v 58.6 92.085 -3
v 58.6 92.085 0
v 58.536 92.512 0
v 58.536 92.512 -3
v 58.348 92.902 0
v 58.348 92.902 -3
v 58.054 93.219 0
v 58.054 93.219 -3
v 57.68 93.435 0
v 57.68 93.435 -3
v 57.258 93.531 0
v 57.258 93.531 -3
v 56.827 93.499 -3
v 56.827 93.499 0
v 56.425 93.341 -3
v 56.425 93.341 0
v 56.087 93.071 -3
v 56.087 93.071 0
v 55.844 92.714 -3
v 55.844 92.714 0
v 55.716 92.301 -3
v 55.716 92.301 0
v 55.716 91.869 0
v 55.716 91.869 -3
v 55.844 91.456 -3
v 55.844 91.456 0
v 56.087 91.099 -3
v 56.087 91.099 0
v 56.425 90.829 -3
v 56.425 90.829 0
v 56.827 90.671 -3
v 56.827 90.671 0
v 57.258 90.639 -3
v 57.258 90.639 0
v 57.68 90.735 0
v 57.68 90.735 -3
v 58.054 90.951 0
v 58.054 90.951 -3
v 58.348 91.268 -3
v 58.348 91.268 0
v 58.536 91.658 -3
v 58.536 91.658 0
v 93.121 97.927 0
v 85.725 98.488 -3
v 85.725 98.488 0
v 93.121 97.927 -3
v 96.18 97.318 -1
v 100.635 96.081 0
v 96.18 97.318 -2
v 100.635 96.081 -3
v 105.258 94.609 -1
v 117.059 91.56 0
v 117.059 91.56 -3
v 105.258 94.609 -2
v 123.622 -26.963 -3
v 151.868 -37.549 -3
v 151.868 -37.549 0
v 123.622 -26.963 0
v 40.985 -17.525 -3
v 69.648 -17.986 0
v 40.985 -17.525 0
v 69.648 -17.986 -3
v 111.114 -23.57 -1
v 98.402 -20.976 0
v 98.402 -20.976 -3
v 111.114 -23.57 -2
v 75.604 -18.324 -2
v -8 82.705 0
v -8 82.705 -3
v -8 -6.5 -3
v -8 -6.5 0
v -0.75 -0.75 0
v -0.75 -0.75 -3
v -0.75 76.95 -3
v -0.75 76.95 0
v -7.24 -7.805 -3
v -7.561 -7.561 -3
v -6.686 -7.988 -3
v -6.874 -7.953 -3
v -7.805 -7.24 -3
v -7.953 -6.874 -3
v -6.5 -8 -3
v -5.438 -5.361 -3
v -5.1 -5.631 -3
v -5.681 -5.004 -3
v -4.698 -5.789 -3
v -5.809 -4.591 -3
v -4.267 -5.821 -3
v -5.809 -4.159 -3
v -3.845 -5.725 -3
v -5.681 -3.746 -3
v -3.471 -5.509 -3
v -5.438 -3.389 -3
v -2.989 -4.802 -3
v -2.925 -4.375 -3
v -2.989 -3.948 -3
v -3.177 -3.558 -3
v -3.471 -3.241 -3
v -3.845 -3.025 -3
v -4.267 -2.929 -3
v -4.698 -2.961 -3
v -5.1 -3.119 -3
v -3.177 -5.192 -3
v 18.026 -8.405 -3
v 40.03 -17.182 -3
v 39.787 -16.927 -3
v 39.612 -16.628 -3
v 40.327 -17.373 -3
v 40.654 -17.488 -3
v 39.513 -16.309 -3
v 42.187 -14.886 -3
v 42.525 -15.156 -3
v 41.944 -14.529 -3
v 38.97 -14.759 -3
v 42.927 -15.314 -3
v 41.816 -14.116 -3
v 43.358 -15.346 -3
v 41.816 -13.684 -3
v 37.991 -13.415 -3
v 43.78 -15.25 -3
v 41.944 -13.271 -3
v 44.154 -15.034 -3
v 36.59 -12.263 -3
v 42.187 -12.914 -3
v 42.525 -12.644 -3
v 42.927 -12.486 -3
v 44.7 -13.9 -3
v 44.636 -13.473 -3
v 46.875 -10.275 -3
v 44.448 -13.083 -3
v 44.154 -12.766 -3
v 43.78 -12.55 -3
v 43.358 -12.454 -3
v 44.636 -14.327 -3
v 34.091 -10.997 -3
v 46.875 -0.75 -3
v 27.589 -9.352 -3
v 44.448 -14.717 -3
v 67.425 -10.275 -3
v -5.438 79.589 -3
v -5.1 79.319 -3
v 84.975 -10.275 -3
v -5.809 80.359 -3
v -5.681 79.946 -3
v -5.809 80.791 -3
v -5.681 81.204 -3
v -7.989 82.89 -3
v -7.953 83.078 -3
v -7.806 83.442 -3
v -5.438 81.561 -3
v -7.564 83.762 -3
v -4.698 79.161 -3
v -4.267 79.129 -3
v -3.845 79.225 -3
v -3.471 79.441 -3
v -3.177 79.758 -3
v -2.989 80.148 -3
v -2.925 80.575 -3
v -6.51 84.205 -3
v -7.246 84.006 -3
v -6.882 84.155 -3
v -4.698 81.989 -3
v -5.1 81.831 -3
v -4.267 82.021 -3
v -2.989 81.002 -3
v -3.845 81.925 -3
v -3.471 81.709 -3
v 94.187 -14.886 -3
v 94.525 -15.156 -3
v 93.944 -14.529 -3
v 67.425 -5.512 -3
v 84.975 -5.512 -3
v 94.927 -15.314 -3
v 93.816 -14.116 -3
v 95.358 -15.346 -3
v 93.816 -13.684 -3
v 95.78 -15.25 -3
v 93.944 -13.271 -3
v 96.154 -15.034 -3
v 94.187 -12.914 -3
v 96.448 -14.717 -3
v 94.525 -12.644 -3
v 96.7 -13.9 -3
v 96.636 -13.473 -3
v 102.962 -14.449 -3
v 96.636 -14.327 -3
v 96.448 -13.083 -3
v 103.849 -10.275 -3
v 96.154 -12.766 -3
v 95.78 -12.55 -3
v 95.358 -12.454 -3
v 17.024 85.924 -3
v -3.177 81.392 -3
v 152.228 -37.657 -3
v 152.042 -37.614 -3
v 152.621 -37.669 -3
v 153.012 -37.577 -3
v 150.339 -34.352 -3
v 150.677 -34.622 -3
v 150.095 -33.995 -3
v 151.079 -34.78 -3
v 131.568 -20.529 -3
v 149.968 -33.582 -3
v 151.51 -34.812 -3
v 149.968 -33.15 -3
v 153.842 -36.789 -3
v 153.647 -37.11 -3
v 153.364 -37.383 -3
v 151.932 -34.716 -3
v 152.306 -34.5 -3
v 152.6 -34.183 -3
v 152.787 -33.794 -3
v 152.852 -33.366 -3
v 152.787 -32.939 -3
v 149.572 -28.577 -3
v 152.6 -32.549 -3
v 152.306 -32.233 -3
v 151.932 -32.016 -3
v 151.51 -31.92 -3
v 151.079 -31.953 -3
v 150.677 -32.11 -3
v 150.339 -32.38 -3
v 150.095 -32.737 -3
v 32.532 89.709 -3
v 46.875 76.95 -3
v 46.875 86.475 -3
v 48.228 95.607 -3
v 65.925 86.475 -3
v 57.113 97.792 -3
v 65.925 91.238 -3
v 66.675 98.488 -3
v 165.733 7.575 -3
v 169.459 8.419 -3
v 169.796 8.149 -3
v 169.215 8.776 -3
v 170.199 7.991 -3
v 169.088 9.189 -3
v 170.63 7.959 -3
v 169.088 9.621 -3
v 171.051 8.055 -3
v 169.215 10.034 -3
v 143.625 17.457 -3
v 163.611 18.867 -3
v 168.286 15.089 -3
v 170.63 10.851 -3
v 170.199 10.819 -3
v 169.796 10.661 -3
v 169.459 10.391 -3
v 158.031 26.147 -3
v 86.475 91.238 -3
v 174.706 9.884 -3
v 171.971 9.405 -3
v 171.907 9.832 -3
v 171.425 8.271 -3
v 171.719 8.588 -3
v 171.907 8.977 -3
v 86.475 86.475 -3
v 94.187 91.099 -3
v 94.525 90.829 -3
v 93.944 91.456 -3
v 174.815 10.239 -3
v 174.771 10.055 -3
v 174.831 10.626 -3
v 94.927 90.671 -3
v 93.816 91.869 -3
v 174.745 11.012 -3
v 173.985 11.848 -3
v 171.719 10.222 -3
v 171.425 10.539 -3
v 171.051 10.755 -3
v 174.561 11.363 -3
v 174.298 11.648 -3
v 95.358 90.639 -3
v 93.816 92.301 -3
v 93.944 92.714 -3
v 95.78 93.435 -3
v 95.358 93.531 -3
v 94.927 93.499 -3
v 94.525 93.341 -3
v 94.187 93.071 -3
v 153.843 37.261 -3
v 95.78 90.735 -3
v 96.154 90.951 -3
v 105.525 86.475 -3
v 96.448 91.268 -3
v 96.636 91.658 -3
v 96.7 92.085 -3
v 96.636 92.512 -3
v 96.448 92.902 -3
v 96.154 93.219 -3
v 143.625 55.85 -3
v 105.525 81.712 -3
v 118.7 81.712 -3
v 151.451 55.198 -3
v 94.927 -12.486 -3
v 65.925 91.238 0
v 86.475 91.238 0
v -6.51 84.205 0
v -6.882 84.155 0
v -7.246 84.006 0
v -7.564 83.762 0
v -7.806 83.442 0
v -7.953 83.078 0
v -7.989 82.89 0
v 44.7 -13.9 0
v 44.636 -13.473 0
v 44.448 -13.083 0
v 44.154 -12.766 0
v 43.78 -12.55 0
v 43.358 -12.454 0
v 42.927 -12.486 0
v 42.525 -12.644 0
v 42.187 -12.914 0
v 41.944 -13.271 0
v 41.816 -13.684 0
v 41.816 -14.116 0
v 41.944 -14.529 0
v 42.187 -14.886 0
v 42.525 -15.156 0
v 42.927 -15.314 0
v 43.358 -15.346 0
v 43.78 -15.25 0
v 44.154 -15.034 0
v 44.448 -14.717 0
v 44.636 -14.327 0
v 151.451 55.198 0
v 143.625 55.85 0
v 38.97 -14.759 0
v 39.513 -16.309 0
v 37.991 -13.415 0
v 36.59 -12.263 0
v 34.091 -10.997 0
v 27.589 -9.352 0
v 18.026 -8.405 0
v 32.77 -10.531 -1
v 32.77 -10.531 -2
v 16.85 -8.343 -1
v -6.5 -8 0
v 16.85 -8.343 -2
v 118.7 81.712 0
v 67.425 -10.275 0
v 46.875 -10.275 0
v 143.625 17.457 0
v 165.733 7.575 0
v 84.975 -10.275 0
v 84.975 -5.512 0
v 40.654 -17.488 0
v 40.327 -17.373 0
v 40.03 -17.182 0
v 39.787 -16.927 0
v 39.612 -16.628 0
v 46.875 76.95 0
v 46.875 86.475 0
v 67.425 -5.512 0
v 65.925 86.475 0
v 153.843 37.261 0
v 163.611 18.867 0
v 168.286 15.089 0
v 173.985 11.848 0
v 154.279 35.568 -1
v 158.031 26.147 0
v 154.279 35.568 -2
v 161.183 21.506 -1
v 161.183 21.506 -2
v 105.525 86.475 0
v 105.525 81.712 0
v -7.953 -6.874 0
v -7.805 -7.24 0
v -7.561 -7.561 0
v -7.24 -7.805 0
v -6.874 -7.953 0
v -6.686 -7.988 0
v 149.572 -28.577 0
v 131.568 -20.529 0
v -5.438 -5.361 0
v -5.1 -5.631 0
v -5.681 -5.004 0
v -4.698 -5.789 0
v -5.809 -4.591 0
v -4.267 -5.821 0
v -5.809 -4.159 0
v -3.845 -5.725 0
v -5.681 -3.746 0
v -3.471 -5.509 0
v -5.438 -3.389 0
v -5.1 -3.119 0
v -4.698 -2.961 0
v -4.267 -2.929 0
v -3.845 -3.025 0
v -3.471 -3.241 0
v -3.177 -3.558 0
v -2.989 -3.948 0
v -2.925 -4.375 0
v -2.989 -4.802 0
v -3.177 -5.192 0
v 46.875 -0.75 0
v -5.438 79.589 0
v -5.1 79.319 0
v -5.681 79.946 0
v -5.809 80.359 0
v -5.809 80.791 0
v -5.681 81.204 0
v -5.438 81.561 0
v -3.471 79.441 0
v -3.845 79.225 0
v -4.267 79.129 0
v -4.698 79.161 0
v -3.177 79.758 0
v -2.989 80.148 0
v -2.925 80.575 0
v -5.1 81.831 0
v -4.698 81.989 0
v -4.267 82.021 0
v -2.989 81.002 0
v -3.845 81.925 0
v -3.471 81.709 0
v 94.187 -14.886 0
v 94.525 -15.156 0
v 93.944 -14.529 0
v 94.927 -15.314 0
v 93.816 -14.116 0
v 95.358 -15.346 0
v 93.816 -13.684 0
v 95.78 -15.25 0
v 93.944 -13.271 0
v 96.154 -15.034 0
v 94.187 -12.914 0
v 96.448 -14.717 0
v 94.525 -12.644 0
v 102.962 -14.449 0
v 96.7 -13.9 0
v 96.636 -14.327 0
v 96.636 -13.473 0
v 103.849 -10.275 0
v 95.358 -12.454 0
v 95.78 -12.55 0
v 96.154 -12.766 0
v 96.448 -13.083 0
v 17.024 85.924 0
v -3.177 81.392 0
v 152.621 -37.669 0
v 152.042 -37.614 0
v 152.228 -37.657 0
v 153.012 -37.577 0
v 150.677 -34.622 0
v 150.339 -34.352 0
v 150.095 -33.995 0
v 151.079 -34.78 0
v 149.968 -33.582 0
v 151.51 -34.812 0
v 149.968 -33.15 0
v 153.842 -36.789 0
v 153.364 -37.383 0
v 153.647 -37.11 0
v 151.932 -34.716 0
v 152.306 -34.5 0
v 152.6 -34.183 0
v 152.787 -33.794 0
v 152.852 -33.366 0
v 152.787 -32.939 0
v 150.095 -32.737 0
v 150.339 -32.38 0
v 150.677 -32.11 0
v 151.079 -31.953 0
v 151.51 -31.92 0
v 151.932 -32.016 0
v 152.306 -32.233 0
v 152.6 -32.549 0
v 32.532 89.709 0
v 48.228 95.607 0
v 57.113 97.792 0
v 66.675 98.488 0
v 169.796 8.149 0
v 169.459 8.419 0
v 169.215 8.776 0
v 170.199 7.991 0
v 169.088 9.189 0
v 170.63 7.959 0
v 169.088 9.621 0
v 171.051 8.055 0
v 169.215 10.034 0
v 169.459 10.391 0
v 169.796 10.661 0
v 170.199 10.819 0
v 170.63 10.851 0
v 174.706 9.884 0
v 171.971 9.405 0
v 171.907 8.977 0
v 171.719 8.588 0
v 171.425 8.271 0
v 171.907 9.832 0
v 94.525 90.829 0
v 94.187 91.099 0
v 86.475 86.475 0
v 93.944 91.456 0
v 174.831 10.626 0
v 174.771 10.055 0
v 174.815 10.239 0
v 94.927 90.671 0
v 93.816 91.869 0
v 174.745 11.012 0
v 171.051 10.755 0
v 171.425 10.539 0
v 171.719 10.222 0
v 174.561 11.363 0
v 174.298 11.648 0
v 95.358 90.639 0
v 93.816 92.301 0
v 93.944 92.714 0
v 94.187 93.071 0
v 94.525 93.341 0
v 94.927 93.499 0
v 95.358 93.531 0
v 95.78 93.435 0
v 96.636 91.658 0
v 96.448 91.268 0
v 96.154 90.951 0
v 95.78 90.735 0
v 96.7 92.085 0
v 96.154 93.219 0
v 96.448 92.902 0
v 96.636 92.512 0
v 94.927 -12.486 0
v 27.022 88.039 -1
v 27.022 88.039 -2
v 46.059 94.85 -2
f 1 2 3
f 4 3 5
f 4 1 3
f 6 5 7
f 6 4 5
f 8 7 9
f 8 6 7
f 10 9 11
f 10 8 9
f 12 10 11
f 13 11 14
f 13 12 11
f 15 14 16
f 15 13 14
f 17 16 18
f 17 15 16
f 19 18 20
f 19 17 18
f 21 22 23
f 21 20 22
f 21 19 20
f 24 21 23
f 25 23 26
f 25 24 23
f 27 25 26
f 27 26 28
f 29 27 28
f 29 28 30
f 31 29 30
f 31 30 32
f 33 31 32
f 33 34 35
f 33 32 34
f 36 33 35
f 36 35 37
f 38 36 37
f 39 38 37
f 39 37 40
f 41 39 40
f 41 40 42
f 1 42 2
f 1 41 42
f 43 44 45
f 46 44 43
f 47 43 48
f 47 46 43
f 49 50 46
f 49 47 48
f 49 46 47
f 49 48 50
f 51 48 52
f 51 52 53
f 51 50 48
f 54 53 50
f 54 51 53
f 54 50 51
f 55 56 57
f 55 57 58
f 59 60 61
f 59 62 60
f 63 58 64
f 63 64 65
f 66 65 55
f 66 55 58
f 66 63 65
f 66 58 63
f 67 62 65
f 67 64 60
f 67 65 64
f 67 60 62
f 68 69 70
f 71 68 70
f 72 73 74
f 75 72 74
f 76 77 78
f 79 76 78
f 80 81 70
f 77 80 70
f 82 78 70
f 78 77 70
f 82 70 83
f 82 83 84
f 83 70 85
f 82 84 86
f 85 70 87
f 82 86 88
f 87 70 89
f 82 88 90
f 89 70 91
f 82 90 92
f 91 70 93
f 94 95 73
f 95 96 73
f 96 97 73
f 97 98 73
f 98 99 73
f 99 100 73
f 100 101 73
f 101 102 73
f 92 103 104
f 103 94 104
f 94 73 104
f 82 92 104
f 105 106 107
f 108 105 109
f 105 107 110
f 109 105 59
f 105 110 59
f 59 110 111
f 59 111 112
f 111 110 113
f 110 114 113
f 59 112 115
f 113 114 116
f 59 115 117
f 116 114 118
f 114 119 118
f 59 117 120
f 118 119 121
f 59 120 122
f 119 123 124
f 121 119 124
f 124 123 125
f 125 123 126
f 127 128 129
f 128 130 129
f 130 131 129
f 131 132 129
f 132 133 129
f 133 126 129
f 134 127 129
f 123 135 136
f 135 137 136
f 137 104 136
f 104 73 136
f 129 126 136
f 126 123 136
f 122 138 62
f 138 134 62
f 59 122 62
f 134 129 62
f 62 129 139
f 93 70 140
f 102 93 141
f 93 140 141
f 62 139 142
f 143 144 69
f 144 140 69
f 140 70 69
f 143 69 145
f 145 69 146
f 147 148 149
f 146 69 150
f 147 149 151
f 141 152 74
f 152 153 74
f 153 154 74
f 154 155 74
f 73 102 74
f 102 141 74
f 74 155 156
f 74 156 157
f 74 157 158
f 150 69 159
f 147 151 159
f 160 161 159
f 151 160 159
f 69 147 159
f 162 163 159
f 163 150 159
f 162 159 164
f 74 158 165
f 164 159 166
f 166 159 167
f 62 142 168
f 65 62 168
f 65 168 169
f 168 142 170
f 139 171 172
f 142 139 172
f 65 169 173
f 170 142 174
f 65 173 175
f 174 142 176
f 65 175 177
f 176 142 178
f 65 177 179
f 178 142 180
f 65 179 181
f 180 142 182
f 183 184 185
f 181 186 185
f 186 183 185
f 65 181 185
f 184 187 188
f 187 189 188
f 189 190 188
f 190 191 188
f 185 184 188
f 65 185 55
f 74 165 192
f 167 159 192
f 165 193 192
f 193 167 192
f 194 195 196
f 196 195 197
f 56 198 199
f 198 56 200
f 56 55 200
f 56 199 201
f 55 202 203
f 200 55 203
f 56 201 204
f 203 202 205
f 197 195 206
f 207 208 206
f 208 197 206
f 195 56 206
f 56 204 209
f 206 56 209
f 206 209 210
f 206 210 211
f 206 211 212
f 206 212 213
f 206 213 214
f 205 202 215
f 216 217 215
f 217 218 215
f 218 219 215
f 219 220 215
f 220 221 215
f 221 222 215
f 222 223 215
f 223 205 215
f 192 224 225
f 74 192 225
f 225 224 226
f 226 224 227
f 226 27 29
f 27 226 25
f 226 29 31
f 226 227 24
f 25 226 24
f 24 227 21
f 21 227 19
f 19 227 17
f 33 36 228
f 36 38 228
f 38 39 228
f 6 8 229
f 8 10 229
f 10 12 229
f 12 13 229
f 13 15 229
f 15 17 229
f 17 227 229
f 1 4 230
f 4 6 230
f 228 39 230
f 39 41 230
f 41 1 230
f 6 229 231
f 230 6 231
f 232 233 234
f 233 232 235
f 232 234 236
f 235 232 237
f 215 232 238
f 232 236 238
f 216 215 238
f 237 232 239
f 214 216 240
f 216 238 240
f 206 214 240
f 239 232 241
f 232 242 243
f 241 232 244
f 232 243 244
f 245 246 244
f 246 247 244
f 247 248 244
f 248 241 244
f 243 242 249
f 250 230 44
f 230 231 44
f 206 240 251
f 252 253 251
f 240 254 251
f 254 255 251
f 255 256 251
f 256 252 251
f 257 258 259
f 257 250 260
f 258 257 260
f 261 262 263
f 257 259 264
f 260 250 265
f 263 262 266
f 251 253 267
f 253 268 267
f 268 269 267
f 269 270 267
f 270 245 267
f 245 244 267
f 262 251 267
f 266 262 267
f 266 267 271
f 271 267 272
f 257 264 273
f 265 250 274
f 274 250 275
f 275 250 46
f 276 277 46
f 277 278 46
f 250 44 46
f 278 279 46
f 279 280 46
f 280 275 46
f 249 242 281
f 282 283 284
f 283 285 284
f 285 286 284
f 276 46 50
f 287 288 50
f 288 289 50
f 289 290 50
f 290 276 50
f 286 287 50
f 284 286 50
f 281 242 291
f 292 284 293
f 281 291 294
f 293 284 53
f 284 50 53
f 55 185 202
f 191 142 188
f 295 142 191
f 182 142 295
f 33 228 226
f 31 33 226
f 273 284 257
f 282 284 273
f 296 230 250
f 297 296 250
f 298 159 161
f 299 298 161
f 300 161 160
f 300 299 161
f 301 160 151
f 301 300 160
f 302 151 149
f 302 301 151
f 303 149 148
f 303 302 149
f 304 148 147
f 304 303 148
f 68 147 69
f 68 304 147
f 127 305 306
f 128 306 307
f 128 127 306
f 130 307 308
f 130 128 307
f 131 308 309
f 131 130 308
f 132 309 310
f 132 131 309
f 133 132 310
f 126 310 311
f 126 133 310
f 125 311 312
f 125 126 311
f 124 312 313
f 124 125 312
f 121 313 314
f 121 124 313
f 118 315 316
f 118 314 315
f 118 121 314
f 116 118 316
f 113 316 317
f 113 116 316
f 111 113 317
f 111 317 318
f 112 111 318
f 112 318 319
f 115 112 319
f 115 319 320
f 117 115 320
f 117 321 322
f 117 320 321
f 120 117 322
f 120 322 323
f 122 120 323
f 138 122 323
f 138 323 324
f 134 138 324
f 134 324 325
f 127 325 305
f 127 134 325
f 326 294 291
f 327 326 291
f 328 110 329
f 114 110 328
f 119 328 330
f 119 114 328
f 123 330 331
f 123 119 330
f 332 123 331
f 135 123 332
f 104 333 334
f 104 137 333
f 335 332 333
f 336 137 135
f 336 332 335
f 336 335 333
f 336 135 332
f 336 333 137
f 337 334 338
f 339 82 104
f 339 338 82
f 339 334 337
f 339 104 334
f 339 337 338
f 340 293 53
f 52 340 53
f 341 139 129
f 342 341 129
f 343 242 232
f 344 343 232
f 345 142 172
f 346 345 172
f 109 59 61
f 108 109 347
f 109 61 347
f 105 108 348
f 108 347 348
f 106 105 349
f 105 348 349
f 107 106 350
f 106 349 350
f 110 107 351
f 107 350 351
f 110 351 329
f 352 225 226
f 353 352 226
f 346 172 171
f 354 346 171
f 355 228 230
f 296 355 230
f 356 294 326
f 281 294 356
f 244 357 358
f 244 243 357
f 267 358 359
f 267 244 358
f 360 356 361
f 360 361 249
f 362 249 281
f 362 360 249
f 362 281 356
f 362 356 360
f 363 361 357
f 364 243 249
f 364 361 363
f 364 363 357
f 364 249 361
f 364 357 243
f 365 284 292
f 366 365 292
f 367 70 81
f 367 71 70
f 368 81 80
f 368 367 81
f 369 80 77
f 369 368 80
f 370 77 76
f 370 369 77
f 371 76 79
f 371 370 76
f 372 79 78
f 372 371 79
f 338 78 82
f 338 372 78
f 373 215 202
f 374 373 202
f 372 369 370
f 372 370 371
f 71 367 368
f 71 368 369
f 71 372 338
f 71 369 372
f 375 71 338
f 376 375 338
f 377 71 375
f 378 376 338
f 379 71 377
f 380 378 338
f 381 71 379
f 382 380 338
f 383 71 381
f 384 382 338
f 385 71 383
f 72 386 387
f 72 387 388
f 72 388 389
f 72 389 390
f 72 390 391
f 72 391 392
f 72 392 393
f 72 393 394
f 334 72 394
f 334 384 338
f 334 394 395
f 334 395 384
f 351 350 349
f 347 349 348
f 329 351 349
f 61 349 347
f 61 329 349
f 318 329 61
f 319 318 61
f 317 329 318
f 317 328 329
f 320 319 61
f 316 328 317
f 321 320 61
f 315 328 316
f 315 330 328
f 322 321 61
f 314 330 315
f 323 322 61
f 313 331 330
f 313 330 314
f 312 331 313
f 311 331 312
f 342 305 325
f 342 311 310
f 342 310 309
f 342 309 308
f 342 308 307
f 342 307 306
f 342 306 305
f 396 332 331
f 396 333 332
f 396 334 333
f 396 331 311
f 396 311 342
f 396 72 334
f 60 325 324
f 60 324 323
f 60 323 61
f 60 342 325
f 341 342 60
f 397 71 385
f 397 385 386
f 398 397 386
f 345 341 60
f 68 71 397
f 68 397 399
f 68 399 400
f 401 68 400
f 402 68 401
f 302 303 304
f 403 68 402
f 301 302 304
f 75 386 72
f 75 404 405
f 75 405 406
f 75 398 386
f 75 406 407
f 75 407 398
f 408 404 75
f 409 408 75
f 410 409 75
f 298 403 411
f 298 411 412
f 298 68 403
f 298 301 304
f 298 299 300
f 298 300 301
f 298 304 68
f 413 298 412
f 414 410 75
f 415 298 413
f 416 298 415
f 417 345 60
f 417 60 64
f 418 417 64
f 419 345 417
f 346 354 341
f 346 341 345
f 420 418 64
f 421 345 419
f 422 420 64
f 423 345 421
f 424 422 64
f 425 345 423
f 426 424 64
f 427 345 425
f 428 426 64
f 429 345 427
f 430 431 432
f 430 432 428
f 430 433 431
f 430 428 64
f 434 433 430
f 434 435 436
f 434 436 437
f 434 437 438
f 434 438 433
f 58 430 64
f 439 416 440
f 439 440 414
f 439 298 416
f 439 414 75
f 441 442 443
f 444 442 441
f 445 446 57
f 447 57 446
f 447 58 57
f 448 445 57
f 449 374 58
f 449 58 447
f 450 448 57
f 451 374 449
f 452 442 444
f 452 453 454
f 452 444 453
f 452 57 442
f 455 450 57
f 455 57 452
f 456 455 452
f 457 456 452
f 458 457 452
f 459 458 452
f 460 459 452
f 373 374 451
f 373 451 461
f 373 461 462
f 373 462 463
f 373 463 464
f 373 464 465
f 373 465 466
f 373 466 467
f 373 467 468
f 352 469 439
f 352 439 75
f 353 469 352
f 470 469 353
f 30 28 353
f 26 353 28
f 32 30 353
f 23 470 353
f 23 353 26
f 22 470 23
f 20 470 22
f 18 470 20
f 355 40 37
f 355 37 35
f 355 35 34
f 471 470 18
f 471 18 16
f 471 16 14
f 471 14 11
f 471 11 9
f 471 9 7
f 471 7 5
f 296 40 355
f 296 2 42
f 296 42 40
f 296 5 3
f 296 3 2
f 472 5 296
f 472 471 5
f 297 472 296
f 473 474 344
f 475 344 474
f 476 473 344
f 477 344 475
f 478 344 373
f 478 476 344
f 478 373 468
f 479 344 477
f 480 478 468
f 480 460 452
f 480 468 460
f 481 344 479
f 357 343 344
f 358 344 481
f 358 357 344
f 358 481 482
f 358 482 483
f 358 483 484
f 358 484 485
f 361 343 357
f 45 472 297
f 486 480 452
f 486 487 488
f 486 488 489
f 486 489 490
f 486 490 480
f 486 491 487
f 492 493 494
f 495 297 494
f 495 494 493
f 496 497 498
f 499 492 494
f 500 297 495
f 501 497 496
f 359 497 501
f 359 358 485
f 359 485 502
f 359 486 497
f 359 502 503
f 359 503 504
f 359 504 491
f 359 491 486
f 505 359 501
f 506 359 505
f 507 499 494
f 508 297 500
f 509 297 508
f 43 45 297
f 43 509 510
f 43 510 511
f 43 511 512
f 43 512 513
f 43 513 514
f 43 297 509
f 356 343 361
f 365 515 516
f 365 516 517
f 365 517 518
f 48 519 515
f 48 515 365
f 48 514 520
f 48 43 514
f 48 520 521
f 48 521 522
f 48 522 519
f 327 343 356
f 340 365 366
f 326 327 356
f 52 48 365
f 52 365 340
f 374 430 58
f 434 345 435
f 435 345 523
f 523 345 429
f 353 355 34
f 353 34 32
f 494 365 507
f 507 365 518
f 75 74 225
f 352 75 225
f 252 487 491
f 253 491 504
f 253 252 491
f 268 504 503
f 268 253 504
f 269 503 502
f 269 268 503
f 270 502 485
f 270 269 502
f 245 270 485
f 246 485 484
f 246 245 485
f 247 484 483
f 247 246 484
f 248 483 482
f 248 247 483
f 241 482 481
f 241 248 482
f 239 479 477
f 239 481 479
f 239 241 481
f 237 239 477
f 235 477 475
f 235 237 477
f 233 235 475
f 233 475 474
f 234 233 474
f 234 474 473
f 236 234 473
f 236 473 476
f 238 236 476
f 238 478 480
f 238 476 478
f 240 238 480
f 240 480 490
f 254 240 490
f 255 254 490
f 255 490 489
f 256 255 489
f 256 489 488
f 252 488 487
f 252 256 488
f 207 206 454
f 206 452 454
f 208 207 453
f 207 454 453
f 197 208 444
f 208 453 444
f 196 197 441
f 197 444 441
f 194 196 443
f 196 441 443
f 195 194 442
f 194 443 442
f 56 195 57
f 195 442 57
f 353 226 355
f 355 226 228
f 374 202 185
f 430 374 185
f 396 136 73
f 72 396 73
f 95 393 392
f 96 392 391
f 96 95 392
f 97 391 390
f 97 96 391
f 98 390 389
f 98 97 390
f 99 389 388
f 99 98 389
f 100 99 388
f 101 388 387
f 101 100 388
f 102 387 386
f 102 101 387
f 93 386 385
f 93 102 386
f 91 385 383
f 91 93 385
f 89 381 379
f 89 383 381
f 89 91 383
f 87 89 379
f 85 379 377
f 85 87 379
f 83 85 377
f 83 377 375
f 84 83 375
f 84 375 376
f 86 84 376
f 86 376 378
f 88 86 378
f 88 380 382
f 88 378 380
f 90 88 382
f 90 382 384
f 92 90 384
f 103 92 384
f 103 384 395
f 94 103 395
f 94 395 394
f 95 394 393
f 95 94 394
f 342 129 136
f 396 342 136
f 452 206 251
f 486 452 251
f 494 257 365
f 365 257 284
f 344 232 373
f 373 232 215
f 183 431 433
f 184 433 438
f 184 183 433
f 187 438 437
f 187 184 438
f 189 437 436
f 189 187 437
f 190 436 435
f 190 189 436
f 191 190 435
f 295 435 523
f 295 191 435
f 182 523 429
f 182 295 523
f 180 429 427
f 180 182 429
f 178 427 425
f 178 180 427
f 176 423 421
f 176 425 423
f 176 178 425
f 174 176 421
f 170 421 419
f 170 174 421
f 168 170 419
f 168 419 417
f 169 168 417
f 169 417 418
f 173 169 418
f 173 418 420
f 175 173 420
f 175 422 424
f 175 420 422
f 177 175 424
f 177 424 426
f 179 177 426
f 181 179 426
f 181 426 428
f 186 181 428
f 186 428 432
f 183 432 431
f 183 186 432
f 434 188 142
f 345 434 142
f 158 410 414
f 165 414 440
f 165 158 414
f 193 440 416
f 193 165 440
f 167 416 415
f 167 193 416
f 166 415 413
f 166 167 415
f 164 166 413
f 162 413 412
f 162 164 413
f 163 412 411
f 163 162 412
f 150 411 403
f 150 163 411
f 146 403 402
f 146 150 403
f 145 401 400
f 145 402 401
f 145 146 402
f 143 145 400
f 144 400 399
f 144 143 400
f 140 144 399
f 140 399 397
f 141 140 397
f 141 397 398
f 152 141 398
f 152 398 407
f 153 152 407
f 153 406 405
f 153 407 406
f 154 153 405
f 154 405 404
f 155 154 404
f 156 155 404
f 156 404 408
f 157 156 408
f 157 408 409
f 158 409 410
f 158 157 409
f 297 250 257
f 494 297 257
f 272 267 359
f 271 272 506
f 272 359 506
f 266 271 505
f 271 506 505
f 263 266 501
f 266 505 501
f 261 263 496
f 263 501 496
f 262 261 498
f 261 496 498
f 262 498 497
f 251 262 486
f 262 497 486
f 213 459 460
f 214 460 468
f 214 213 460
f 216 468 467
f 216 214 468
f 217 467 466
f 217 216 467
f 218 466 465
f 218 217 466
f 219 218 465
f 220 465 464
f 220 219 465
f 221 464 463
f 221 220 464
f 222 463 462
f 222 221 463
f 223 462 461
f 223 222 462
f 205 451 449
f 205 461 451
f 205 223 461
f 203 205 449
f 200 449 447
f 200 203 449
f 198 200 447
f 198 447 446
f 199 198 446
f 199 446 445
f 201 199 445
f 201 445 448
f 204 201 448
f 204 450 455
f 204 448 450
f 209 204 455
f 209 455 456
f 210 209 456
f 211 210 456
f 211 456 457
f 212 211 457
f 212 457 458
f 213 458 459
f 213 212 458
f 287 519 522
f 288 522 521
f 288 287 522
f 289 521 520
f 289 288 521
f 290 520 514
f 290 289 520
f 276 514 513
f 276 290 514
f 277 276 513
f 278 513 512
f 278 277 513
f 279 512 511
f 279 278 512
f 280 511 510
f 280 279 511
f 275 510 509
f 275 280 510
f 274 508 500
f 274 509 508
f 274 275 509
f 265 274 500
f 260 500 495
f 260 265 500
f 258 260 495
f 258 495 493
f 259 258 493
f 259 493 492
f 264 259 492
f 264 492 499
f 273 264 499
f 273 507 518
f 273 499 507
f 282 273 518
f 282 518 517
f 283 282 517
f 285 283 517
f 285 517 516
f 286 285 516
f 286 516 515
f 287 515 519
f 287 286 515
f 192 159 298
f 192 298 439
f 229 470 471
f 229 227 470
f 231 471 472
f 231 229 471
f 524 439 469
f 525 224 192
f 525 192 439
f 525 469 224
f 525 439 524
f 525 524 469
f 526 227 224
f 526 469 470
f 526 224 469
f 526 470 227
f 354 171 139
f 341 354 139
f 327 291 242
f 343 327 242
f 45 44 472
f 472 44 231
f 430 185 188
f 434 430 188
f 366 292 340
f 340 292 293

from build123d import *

# Parameters (mm, degrees)
PAD005_DEPTH    = 3
POCKET008_DEPTH = 5
SKETCH040_R     = 1.45
POCKET020_DEPTH = 15
POCKET026_DEPTH = 14
FILLET003_R     = 1.5


with BuildPart() as part:
    # Sketch024 → Pad005 (new body)
    with BuildSketch(Plane.XY):
        with BuildLine():
            Line((85.725, 98.4875), (66.675, 98.4875))
            add(Edge.make_bspline(
                [(-8, 84.2), (39.625, 84.2), (39.625, 98.4875), (66.675, 98.4875)],
                knots=[0, 0, 0, 0, 1, 1, 1, 1], degree=3))
            Line((-8, 84.2), (-8, -8))
            add(Edge.make_bspline(
                [(39.625, -17.525), (39.625, -8), (20.575, -8), (-8, -8)],
                knots=[0, 0, 0, 0, 1, 1, 1, 1], degree=3))
            add(Edge.make_bspline(
                [(153.231854, -38.154949), (107.082107, -17.525), (76.2, -17.525), (39.625, -17.525)],
                knots=[0, 0, 0, 0, 1, 1, 1, 1], degree=3))
            Line((153.231854, -38.154949), (175.310198, 11.234895))
            add(Edge.make_bspline(
                [(150.875, 88.9625), (150.875, 42.8625), (150.875, 22.157965), (175.310198, 11.234895)],
                knots=[0, 0, 0, 0, 1, 1, 1, 1], degree=3))
            add(Edge.make_bspline(
                [(85.725, 98.4875), (104.775, 98.4875), (104.775, 88.9625), (150.875, 88.9625)],
                knots=[0, 0, 0, 0, 1, 1, 1, 1], degree=3))
        make_face()
    extrude(amount=PAD005_DEPTH)

    # Sketch025 → Pocket008 (cut)
    with BuildSketch(Plane(origin=(0, 0, 0), x_dir=(1, 0, 0), z_dir=(0, 0, -1))):
        Polygon((-0.75, 0.75), (-0.75, -76.95), (46.875, -76.95), (46.875, -86.475), (65.925, -86.475), (65.925, -91.2375), (86.475, -91.2375), (86.475, -86.475), (105.525, -86.475), (105.525, -81.7125), (143.625, -81.7125), (143.625, -17.457464), (165.732668, -7.574851), (149.57181, 28.577419), (131.568158, 20.529392), (102.96164, 14.448889), (103.848827, 10.275), (84.975, 10.275), (84.975, 5.5125), (67.425, 5.5125), (67.425, 10.275), (46.875, 10.275), (46.875, 0.75), align=None)
    extrude(amount=-POCKET008_DEPTH, mode=Mode.SUBTRACT)

    # Sketch040 → Pocket020 (cut)
    with BuildSketch(Plane.XY):
        with Locations((-4.375, -4.375)):
            Circle(SKETCH040_R)
        with Locations((-4.375, 80.575)):
            Circle(SKETCH040_R)
        with Locations((151.401832, -33.366184)):
            Circle(SKETCH040_R)
        with Locations((170.521433, 9.404873)):
            Circle(SKETCH040_R)
        with Locations((147.25, 85.3375)):
            Circle(SKETCH040_R)
        with Locations((43.25, -13.9)):
            Circle(SKETCH040_R)
        with Locations((57.15, 92.085)):
            Circle(SKETCH040_R)
        with Locations((95.25, 92.085)):
            Circle(SKETCH040_R)
        with Locations((95.25, -13.9)):
            Circle(SKETCH040_R)
    extrude(amount=POCKET020_DEPTH, mode=Mode.SUBTRACT)

    # Sketch054 → Pocket026 (cut)
    with BuildSketch(Plane.XY):
        Polygon((118.825, 80.9625), (116.825, 92.9625), (166.907578, 98.346489), (154.875, 54.9125), (142.875, 55.9125), align=None)
    extrude(amount=POCKET026_DEPTH, mode=Mode.SUBTRACT)

    # Fillet003
    fillet003_edges = [part.edges().sort_by_distance(p)[0] for p in [
        (-8, -8, 1.5),
        (-8, 84.2, 1.5),
        (175.310198, 11.234895, 1.5),
        (153.231854, -38.154949, 1.5),
        (39.625, -17.525, 1.5),
    ]]
    fillet(fillet003_edges, radius=FILLET003_R)


with BuildPart() as part_1:
    # Body004 placement: moved
    add(part.part.moved(Location((0, 0, -3))))


solid = part_1.part
